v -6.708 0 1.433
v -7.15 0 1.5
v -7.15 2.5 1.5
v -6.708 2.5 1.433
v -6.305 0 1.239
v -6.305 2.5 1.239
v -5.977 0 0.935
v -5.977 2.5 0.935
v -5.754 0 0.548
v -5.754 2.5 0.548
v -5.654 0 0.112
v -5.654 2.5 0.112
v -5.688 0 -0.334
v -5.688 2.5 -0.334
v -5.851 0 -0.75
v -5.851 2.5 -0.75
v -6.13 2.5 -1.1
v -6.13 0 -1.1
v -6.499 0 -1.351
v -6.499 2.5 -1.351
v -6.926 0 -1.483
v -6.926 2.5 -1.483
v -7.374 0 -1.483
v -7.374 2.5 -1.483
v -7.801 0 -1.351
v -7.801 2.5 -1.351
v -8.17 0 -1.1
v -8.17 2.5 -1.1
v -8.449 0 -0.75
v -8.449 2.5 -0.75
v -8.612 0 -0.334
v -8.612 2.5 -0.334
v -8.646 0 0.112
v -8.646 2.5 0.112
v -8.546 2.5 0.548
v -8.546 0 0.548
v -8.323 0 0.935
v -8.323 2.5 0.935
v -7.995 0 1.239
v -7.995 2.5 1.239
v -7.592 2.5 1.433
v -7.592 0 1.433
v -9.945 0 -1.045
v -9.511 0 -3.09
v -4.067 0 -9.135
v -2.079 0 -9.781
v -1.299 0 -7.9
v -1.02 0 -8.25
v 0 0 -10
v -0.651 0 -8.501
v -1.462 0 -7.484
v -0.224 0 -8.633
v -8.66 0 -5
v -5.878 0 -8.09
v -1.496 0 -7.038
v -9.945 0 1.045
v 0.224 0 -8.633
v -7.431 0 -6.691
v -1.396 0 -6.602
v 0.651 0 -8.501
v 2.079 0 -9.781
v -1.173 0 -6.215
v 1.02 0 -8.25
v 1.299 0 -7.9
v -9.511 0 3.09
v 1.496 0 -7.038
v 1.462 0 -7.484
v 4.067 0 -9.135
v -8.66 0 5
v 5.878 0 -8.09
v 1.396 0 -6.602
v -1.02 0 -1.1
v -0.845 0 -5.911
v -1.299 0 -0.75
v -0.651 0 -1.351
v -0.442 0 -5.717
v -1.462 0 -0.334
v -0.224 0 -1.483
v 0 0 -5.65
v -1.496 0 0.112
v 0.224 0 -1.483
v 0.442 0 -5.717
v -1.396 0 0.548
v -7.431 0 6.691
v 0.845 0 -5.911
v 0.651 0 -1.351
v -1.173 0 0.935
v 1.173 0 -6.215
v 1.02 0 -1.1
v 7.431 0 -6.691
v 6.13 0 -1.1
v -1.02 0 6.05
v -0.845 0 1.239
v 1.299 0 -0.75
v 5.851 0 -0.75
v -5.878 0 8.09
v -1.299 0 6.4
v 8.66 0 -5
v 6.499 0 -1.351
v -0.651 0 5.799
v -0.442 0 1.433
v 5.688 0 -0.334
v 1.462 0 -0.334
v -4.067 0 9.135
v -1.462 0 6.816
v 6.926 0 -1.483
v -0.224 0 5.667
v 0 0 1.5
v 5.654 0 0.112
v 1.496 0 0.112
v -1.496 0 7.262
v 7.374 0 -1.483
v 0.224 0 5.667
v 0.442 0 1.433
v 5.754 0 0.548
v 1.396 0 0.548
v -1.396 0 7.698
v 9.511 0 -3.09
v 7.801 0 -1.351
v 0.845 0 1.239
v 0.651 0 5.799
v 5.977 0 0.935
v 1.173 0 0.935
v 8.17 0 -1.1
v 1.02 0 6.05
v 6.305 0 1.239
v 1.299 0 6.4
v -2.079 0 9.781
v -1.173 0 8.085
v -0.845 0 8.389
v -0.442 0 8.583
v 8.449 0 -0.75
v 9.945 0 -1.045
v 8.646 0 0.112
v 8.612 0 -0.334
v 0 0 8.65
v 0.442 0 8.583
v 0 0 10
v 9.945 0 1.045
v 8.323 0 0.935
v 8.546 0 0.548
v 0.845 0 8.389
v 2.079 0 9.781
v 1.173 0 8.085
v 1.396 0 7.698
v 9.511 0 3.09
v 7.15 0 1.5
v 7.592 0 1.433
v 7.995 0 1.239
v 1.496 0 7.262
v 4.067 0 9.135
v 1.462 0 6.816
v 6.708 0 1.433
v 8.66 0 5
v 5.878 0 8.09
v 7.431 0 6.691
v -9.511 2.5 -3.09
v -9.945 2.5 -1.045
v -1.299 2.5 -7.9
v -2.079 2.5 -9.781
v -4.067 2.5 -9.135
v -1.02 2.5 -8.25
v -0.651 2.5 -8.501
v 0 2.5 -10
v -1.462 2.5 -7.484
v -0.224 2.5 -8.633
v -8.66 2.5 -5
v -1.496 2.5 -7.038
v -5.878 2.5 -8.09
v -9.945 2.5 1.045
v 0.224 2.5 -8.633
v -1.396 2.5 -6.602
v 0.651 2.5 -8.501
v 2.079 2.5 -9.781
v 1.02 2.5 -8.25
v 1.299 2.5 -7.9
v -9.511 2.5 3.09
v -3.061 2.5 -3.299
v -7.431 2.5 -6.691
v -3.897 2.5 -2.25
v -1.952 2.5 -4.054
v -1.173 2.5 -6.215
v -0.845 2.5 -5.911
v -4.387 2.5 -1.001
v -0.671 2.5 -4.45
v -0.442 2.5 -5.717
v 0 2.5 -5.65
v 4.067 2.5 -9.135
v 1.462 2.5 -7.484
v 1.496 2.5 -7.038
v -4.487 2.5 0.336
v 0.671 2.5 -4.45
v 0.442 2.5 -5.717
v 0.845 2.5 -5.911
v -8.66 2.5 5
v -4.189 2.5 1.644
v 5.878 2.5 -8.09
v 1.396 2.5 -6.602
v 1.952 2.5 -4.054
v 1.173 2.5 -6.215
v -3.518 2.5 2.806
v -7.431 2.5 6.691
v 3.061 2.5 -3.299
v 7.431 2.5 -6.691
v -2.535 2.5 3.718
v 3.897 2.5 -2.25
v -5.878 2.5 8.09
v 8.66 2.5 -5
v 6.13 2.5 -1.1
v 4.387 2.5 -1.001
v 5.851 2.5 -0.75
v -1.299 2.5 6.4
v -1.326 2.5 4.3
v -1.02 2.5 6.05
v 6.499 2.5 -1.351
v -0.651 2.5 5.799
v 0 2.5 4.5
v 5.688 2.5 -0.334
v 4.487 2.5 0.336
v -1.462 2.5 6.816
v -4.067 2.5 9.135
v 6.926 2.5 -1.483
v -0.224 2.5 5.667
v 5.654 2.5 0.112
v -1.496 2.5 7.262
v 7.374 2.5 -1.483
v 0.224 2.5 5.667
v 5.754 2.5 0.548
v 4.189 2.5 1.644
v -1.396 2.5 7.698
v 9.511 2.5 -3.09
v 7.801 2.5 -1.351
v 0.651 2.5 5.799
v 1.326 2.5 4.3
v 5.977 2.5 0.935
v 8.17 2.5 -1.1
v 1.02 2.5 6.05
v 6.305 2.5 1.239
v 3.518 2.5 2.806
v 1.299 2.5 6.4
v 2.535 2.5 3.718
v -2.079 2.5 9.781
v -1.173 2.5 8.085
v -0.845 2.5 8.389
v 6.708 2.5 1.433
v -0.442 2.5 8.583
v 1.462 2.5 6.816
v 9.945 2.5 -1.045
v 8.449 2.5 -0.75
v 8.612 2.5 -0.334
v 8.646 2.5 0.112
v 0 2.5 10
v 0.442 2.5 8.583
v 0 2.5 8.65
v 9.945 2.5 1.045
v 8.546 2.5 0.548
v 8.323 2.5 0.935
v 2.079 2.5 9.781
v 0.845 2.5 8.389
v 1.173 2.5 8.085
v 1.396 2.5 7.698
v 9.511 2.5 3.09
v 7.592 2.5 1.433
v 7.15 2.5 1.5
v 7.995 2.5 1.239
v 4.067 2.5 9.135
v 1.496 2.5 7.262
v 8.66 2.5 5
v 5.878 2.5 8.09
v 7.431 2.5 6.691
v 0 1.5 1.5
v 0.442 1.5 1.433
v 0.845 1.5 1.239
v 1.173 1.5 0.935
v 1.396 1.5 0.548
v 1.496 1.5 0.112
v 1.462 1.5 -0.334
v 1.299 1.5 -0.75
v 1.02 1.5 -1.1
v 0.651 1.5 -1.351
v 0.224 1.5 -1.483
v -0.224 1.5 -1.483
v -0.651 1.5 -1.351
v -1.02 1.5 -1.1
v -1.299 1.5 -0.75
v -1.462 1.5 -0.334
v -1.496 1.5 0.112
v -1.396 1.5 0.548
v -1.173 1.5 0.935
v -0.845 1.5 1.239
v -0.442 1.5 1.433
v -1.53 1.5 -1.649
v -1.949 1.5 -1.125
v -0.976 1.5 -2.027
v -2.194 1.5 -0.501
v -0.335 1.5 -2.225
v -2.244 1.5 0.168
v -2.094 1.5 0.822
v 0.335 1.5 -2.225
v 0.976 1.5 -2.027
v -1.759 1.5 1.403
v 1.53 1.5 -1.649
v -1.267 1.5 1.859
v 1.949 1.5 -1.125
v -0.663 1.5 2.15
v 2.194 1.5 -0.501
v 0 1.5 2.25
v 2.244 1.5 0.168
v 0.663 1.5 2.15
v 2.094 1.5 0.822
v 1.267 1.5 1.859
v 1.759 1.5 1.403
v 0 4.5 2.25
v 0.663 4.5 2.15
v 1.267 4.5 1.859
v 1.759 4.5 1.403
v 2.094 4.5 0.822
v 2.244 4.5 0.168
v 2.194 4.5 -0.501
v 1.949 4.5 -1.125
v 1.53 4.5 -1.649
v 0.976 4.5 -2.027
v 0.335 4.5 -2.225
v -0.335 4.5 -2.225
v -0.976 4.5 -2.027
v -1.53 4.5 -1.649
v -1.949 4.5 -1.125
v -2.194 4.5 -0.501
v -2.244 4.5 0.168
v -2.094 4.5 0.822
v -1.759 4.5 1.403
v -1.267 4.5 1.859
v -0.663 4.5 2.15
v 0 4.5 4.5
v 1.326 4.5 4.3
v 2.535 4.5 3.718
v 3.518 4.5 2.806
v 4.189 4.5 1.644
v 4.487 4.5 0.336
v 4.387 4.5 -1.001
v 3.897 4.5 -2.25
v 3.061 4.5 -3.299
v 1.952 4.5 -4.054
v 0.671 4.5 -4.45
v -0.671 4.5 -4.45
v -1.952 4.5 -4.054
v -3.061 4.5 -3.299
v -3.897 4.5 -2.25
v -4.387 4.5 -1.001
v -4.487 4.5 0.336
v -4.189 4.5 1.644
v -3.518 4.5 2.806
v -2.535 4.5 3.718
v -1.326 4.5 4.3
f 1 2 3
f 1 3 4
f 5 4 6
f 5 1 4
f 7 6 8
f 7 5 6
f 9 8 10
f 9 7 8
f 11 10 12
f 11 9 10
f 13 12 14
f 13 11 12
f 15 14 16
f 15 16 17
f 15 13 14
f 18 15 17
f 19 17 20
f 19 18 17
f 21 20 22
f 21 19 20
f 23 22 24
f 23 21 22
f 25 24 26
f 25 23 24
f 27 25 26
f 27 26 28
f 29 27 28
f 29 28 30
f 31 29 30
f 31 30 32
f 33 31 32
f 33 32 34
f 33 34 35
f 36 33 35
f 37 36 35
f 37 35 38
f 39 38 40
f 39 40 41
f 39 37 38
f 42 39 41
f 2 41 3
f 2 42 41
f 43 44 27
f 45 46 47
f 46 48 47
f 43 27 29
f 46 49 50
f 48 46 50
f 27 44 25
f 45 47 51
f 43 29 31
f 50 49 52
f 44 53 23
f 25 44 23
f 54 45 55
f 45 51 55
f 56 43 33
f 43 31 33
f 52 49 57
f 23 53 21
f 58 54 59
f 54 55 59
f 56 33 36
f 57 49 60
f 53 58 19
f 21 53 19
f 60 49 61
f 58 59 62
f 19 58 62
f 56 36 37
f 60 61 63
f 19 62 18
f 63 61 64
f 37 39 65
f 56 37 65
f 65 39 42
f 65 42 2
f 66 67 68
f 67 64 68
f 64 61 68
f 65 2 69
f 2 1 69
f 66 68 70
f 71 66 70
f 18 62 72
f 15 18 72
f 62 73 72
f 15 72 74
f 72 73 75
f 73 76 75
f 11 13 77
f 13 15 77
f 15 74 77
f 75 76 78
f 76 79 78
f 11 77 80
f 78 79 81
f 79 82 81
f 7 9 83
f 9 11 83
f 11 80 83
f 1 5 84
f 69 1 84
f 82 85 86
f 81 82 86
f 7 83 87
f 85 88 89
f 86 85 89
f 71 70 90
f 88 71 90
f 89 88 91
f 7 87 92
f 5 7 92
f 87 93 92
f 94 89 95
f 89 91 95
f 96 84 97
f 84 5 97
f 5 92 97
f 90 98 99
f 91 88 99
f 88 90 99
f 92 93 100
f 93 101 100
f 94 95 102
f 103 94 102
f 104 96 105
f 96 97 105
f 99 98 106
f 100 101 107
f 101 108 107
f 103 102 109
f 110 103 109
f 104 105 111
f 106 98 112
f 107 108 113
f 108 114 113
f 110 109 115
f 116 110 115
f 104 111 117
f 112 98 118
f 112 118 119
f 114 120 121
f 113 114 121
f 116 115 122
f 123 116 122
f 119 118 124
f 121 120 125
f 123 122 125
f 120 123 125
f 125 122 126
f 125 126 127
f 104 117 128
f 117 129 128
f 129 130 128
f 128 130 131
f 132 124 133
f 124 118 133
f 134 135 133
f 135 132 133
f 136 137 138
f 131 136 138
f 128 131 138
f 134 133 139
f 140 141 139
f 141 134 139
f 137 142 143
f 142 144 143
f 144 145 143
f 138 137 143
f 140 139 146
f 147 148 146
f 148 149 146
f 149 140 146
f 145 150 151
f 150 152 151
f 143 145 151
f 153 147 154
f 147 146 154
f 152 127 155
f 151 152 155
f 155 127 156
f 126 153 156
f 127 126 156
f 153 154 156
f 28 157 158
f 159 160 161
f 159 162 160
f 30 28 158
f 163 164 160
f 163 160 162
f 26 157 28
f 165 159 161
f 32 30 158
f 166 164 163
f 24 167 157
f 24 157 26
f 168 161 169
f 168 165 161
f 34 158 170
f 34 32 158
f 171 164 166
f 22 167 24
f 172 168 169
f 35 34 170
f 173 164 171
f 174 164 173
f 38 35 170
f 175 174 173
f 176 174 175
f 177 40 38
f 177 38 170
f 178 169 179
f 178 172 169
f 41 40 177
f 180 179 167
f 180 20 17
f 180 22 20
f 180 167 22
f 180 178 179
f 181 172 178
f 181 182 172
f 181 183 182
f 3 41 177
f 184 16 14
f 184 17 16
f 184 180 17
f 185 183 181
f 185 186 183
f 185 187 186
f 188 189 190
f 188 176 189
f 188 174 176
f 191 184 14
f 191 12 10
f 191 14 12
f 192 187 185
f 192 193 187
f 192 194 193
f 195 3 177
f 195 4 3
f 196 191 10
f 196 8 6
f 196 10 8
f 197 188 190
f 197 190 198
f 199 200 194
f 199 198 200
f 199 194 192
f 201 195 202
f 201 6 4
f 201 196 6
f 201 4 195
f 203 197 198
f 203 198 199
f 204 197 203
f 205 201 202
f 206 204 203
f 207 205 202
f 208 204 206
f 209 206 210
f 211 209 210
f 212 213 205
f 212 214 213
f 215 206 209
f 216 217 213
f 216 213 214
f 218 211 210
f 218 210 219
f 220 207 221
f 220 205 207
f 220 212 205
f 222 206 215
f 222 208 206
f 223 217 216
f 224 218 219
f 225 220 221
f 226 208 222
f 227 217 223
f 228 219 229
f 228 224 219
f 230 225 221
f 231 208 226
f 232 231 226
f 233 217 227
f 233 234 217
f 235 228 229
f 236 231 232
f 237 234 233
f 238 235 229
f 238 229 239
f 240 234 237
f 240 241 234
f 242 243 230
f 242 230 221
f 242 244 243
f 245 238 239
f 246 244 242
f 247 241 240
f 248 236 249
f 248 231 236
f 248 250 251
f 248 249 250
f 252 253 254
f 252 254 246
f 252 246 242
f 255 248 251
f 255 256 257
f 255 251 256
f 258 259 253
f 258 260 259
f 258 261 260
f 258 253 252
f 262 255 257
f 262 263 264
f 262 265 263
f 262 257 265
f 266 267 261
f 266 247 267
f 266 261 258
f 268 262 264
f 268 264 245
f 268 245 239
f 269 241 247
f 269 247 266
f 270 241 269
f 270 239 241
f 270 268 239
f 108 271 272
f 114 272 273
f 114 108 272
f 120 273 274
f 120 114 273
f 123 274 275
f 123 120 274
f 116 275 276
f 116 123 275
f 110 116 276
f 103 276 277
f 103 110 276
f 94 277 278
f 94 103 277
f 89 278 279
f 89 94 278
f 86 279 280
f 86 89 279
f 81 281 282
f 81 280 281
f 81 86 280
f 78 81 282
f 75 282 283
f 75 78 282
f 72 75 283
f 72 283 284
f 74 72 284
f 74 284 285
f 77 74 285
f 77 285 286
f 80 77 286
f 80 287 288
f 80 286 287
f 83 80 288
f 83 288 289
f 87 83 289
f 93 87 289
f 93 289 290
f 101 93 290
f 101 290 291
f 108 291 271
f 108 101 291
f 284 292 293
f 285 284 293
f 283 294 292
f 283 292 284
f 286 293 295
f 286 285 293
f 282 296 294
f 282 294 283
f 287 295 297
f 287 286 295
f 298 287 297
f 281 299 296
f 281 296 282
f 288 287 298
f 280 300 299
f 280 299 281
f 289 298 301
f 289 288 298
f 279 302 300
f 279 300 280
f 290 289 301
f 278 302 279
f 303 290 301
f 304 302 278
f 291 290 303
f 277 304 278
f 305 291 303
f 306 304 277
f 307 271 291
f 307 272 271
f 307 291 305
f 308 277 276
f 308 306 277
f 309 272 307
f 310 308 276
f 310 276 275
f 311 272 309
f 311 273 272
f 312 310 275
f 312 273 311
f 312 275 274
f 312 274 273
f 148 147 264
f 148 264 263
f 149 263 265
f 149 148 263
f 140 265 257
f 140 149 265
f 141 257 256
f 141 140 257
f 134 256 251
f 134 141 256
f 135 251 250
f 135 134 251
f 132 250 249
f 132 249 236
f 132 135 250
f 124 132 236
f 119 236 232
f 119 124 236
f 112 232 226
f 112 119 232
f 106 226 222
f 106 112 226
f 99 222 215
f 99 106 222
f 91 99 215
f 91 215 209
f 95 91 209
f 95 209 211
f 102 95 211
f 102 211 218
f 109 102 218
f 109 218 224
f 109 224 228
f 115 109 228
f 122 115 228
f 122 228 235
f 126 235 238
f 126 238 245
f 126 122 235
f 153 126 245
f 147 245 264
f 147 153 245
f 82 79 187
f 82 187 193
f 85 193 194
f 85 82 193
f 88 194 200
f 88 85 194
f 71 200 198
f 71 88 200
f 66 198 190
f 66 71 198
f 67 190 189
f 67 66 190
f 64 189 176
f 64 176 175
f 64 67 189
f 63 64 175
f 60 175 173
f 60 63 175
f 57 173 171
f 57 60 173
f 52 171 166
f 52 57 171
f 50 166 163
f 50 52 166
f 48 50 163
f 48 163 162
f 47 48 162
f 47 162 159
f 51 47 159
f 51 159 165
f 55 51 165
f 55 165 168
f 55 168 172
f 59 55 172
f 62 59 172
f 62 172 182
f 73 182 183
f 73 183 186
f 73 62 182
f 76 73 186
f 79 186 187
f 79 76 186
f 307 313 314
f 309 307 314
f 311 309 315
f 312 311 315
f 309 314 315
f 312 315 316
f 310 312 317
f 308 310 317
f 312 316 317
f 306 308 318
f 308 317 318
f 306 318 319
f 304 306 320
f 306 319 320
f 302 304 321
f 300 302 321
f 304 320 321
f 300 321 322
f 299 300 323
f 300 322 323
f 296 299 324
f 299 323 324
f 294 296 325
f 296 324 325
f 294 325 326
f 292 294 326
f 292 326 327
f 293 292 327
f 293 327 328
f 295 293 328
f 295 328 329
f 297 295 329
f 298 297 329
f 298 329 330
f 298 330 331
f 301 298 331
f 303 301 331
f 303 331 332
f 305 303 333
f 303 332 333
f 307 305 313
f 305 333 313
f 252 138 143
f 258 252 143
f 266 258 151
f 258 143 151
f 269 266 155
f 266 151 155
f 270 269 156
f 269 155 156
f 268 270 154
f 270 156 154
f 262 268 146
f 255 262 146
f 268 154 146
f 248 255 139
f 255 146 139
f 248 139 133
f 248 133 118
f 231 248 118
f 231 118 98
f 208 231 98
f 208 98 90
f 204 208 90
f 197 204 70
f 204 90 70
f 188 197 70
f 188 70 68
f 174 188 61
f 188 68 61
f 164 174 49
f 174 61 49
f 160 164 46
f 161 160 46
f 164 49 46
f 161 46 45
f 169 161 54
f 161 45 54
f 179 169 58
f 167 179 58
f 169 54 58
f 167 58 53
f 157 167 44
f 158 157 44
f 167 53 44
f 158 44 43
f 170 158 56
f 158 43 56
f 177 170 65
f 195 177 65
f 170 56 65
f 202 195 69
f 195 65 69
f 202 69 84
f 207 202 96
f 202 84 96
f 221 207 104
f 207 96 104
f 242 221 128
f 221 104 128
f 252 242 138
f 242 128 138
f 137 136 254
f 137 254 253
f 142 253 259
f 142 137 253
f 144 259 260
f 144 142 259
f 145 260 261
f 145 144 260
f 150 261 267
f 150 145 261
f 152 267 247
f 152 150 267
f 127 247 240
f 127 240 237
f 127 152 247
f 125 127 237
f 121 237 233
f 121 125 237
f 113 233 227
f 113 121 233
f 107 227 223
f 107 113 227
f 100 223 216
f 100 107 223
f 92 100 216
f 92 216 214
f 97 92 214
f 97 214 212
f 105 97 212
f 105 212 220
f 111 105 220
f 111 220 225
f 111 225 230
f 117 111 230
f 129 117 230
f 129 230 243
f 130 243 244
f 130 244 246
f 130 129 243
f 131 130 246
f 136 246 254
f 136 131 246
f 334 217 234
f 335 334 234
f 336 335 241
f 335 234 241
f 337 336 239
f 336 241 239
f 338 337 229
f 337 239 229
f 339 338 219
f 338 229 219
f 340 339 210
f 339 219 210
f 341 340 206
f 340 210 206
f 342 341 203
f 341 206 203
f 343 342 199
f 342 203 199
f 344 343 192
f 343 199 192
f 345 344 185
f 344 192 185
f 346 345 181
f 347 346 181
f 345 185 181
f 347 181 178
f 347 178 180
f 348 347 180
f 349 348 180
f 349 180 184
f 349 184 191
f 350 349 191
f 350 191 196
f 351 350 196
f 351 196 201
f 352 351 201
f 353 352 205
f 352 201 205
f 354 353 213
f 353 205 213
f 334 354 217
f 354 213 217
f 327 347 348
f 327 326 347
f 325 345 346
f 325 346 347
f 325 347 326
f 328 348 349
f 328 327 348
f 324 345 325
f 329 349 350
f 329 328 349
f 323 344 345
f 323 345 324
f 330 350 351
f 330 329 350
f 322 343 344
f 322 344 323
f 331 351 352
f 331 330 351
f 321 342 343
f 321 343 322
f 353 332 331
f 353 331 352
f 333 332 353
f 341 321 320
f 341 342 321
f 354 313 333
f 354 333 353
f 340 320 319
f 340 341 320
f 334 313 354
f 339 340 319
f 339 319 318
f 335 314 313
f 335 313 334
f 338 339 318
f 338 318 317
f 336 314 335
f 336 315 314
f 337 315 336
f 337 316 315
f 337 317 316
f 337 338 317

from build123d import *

# Parameters (mm, degrees)
SKETCH1_R           = 10
SKETCH1_R_2         = 1.5
BOSS_EXTRUDE1_DEPTH = 2.5
SKETCH2_R           = 4.5
BOSS_EXTRUDE2_DEPTH = 2
SKETCH3_R           = 2.25
CUT_EXTRUDE1_DEPTH  = 3


with BuildPart() as part:
    # Sketch1 → Boss-Extrude1 (new body)
    with BuildSketch(Plane(origin=(0, 0, 0), x_dir=(1, 0, 0), z_dir=(0, 1, 0))):
        with Locations(Location((0, 0, 0), (0, 0, 270))):
            Circle(SKETCH1_R)
        with Locations(Location((0, 0, 0), (0, 0, 270))):
            Circle(SKETCH1_R_2, mode=Mode.SUBTRACT)
        with Locations(Location((0, 7.15, 0), (0, 0, 270))):
            Circle(SKETCH1_R_2, mode=Mode.SUBTRACT)
        with Locations(Location((7.15, 0, 0), (0, 0, 270))):
            Circle(SKETCH1_R_2, mode=Mode.SUBTRACT)
        with Locations(Location((0, -7.15, 0), (0, 0, 270))):
            Circle(SKETCH1_R_2, mode=Mode.SUBTRACT)
        with Locations(Location((-7.15, 0, 0), (0, 0, 270))):
            Circle(SKETCH1_R_2, mode=Mode.SUBTRACT)
    extrude(amount=BOSS_EXTRUDE1_DEPTH)

    # Sketch2 → Boss-Extrude2 (add)
    with BuildSketch(Plane(origin=(0, 2.5, 0), x_dir=(1, 0, 0), z_dir=(0, 1, 0))):
        with Locations(Location((0, 0, 0), (0, 0, 270))):
            Circle(SKETCH2_R)
    extrude(amount=BOSS_EXTRUDE2_DEPTH)

    # Sketch3 → Cut-Extrude1 (cut)
    with BuildSketch(Plane(origin=(0, 4.5, 0), x_dir=(1, 0, 0), z_dir=(0, 1, 0))):
        with Locations(Location((0, 0, 0), (0, 0, 270))):
            Circle(SKETCH3_R)
    extrude(amount=-CUT_EXTRUDE1_DEPTH, mode=Mode.SUBTRACT)


solid = part.part
